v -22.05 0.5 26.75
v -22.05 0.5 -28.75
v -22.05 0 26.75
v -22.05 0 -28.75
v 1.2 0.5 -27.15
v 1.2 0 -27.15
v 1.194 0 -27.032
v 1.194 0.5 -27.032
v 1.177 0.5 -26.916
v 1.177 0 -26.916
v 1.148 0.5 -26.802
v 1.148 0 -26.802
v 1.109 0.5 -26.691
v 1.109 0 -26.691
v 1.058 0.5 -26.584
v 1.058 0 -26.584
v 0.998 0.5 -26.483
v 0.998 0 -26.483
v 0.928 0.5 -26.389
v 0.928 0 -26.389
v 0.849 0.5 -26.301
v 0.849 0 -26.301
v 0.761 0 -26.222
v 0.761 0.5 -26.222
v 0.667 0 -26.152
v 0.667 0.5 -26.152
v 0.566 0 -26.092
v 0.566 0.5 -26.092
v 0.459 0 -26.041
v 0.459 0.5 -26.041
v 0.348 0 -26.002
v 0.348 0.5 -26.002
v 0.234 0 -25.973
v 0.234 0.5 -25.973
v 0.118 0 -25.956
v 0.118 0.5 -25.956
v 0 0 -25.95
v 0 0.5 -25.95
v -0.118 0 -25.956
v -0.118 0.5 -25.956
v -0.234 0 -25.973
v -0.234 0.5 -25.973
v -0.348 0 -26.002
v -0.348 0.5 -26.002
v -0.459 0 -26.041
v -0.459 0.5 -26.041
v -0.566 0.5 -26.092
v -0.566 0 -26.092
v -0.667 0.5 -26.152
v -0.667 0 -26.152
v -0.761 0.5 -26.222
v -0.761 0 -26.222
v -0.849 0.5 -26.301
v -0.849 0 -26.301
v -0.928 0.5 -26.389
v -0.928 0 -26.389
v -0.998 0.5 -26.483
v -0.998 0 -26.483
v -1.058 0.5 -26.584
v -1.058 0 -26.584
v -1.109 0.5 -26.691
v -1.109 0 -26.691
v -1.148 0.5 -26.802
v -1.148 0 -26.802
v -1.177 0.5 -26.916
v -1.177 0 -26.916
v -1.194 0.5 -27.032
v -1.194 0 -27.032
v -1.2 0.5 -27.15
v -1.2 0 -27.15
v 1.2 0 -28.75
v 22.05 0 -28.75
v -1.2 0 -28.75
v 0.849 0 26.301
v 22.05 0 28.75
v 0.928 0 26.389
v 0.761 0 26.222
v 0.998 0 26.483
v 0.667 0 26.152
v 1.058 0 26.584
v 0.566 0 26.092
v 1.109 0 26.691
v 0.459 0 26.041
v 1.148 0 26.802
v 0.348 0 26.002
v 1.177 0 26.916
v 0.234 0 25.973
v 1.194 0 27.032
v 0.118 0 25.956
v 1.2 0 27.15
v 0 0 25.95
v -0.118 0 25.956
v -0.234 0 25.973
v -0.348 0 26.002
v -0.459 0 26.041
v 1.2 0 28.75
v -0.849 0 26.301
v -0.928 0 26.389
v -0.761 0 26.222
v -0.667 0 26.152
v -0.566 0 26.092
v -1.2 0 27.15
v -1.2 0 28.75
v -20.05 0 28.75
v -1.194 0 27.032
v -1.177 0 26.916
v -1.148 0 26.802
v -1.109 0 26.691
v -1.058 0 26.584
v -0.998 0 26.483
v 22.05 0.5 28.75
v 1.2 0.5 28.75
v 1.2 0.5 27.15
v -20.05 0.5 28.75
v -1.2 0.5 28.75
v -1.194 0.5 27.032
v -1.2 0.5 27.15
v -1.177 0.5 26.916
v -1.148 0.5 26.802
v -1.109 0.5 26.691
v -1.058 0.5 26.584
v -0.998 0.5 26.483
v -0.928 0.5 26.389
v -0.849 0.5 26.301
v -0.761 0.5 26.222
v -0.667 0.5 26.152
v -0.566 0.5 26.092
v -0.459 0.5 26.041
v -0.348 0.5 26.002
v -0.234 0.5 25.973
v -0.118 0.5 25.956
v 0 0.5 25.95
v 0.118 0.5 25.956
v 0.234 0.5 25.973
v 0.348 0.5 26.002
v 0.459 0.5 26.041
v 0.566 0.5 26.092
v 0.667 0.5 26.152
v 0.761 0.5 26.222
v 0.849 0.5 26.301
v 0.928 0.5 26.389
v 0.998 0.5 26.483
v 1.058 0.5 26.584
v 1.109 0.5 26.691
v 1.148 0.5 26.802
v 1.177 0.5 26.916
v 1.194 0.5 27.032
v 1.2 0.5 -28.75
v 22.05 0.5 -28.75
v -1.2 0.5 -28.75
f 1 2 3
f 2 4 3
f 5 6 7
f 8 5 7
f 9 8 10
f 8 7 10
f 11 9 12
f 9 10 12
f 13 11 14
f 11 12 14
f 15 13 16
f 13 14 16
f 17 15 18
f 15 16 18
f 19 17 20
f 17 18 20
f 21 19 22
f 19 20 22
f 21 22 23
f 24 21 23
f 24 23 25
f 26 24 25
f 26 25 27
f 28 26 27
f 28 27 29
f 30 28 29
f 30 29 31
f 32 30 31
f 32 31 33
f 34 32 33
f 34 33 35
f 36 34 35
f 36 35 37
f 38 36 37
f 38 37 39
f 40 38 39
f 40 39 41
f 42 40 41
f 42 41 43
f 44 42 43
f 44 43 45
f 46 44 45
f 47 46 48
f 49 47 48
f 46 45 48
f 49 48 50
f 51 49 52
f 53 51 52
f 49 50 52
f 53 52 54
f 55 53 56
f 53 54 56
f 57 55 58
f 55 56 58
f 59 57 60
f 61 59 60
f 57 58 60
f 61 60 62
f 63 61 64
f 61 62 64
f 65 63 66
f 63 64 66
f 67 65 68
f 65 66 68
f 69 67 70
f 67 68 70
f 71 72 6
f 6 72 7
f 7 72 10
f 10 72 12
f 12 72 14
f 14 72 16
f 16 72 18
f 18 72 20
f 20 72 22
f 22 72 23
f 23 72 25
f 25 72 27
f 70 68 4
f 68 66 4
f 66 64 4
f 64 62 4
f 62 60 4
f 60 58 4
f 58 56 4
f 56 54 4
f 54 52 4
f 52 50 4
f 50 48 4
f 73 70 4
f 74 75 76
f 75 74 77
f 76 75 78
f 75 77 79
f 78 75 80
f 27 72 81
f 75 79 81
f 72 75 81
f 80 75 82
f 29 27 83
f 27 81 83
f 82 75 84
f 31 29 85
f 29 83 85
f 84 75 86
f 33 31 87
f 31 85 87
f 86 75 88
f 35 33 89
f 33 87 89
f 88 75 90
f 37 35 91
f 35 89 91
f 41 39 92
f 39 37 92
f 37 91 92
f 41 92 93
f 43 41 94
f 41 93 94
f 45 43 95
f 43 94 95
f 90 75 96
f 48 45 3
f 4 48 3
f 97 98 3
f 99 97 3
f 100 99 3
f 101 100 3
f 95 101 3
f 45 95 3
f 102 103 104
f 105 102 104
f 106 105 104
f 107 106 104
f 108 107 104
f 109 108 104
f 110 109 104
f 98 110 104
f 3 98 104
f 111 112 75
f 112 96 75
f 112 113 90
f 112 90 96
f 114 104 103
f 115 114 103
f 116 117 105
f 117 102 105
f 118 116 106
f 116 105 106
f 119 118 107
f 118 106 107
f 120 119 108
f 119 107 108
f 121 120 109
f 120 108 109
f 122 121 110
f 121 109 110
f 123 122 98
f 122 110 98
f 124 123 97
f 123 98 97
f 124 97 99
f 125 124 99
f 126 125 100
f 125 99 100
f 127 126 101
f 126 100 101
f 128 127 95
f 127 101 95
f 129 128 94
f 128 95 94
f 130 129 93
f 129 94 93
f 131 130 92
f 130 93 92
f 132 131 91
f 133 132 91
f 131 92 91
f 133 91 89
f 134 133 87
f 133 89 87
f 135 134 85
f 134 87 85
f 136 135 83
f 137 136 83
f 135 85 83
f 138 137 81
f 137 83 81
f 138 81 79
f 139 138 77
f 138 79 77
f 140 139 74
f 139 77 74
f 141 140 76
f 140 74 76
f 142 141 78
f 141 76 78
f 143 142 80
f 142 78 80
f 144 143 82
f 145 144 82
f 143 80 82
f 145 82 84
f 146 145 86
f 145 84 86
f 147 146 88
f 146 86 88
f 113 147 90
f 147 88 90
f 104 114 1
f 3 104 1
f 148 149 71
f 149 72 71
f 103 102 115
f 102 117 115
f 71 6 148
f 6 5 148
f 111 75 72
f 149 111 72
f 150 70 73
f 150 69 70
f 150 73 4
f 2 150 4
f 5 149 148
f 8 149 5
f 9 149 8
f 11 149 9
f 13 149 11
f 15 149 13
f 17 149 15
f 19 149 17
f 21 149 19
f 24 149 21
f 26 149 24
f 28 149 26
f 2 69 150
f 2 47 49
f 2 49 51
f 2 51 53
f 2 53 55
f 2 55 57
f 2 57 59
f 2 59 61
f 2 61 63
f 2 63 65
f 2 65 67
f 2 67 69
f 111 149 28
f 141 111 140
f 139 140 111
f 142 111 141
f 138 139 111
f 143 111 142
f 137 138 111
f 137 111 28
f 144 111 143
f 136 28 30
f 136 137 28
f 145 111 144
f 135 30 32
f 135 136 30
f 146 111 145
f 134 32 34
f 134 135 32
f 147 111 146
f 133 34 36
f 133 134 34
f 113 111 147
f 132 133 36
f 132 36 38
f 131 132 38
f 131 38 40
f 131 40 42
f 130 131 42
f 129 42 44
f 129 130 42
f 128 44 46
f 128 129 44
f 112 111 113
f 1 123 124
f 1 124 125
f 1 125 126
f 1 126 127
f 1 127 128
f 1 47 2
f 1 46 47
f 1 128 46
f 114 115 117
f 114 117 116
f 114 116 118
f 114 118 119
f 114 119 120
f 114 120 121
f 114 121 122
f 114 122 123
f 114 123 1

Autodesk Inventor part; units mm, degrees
ref_plane "YZ Plane" through (0, 0, 0) normal (1, 0, 0) x (0, 1, 0)
ref_plane "XZ Plane" through (0, 0, 0) normal (0, 1, 0) x (-1, 0, 0)
ref_plane "XY Plane" through (0, 0, 0) normal (0, 0, 1) x (1, 0, 0)
sketch "Sketch2" plane through (0, 0, 0) normal (0, 1, 0) x (-1, 0, 0)
  line L0 (-22.05, -28.75) -> (22.05, -28.75)
  line L1 (22.05, -28.75) -> (22.05, 28.75)
  line L2 (22.05, 28.75) -> (-22.05, 28.75)
  line L3 (-22.05, 28.75) -> (-22.05, -28.75)
  line L4 (-22.05, -28.75) -> (22.05, 28.75) construction
  line L5 (22.05, -28.75) -> (-22.05, 28.75) construction
  point P0 (0, 0)
  dimension "d28" = 44.1
  dimension "d29" = 57.5
extrude "Extrusion2" add sketch "Sketch2" along normal blind 0.5
sketch "Sketch4" plane through (0, 0.5, 0) normal (0, 1, 0) x (1, 0, 0)
  line L0 (-22.05, 28.75) -> (-22.05, -28.75) projected
  line L1 (-22.05, -28.75) -> (22.05, -28.75) projected
  line L2 (22.05, -28.75) -> (22.05, 28.75) projected
  line L3 (22.05, 28.75) -> (-22.05, 28.75) projected
  point P0 (0, 0)
  point P1 (0, -27.15)
  point P2 (0, 27.15)
  point P3 (-18, -28.75)
  point P4 (-12.775, 28.75)
  dimension "d37" = 22.05
  dimension "d38" = 1.6
  dimension "d40" = 1.6
  dimension "d68" = 44.1
hole "Hole1" at (0, 0.5, 27.15) at (0, 0.5, -27.15) direction (0, -1, 0) diameter 2.4 end through all clearance for "Flat Head Machine Screw" size "M2" standard "Ansi Metric M Profile"
sketch "Sketch5" plane through (0, 0.5, 0) normal (0, 1, 0) x (1, 0, 0)
  line L0 (-22.05, -28.75) -> (22.05, -28.75) projected
  line L1 (-20.05, -28.75) -> (-22.05, -26.75)
  line L2 (-22.05, 28.75) -> (-22.05, -28.75) projected
  point P0 (0, 0)
  point P1 (-18, -28.75)
  dimension "d49" = 2
  dimension "d50" = 2
extrude "Extrusion4" cut sketch "Sketch5" against normal through all
sketch "Sketch6" plane through (0, 0.5, 0) normal (0, 1, 0) x (1, 0, 0)
  circle A0 centre (0, -27.15) radius 1.2 projected
  line L0 (-1.2, -27.15) -> (-1.2, -28.75)
  line L1 (-22.05, -28.75) -> (22.05, -28.75) projected
  line L2 (1.2, -27.15) -> (1.2, -28.75)
  line L3 (1.2, -27.15) -> (-1.2, -27.15)
  line L4 (24.0299, 0) -> (-42.1887, 0)
  line L5 (-1.2, 27.15) -> (-1.2, 28.75)
  line L6 (1.2, 27.15) -> (1.2, 28.75)
  line L7 (1.2, 27.15) -> (-1.2, 27.15)
  line L8 (22.05, 28.75) -> (-22.05, 28.75) projected
  point P0 (0, 0)
  point P1 (-15.5, -28.75)
  point P2 (17.3, -28.75)
  point P3 (0, 27.15)
  point P4 (15.5, 28.75)
  point P5 (-17.3, 28.75)
extrude "Extrusion5" cut sketch "Sketch6" against normal through all contours L2 L1 L0 A0 | L5 L8 L6 L7
equation "\"d37\" = 0.5 * d68"
equation "\"d40\" = d38"
properties part number "etl standard baseplate with cutouts"
